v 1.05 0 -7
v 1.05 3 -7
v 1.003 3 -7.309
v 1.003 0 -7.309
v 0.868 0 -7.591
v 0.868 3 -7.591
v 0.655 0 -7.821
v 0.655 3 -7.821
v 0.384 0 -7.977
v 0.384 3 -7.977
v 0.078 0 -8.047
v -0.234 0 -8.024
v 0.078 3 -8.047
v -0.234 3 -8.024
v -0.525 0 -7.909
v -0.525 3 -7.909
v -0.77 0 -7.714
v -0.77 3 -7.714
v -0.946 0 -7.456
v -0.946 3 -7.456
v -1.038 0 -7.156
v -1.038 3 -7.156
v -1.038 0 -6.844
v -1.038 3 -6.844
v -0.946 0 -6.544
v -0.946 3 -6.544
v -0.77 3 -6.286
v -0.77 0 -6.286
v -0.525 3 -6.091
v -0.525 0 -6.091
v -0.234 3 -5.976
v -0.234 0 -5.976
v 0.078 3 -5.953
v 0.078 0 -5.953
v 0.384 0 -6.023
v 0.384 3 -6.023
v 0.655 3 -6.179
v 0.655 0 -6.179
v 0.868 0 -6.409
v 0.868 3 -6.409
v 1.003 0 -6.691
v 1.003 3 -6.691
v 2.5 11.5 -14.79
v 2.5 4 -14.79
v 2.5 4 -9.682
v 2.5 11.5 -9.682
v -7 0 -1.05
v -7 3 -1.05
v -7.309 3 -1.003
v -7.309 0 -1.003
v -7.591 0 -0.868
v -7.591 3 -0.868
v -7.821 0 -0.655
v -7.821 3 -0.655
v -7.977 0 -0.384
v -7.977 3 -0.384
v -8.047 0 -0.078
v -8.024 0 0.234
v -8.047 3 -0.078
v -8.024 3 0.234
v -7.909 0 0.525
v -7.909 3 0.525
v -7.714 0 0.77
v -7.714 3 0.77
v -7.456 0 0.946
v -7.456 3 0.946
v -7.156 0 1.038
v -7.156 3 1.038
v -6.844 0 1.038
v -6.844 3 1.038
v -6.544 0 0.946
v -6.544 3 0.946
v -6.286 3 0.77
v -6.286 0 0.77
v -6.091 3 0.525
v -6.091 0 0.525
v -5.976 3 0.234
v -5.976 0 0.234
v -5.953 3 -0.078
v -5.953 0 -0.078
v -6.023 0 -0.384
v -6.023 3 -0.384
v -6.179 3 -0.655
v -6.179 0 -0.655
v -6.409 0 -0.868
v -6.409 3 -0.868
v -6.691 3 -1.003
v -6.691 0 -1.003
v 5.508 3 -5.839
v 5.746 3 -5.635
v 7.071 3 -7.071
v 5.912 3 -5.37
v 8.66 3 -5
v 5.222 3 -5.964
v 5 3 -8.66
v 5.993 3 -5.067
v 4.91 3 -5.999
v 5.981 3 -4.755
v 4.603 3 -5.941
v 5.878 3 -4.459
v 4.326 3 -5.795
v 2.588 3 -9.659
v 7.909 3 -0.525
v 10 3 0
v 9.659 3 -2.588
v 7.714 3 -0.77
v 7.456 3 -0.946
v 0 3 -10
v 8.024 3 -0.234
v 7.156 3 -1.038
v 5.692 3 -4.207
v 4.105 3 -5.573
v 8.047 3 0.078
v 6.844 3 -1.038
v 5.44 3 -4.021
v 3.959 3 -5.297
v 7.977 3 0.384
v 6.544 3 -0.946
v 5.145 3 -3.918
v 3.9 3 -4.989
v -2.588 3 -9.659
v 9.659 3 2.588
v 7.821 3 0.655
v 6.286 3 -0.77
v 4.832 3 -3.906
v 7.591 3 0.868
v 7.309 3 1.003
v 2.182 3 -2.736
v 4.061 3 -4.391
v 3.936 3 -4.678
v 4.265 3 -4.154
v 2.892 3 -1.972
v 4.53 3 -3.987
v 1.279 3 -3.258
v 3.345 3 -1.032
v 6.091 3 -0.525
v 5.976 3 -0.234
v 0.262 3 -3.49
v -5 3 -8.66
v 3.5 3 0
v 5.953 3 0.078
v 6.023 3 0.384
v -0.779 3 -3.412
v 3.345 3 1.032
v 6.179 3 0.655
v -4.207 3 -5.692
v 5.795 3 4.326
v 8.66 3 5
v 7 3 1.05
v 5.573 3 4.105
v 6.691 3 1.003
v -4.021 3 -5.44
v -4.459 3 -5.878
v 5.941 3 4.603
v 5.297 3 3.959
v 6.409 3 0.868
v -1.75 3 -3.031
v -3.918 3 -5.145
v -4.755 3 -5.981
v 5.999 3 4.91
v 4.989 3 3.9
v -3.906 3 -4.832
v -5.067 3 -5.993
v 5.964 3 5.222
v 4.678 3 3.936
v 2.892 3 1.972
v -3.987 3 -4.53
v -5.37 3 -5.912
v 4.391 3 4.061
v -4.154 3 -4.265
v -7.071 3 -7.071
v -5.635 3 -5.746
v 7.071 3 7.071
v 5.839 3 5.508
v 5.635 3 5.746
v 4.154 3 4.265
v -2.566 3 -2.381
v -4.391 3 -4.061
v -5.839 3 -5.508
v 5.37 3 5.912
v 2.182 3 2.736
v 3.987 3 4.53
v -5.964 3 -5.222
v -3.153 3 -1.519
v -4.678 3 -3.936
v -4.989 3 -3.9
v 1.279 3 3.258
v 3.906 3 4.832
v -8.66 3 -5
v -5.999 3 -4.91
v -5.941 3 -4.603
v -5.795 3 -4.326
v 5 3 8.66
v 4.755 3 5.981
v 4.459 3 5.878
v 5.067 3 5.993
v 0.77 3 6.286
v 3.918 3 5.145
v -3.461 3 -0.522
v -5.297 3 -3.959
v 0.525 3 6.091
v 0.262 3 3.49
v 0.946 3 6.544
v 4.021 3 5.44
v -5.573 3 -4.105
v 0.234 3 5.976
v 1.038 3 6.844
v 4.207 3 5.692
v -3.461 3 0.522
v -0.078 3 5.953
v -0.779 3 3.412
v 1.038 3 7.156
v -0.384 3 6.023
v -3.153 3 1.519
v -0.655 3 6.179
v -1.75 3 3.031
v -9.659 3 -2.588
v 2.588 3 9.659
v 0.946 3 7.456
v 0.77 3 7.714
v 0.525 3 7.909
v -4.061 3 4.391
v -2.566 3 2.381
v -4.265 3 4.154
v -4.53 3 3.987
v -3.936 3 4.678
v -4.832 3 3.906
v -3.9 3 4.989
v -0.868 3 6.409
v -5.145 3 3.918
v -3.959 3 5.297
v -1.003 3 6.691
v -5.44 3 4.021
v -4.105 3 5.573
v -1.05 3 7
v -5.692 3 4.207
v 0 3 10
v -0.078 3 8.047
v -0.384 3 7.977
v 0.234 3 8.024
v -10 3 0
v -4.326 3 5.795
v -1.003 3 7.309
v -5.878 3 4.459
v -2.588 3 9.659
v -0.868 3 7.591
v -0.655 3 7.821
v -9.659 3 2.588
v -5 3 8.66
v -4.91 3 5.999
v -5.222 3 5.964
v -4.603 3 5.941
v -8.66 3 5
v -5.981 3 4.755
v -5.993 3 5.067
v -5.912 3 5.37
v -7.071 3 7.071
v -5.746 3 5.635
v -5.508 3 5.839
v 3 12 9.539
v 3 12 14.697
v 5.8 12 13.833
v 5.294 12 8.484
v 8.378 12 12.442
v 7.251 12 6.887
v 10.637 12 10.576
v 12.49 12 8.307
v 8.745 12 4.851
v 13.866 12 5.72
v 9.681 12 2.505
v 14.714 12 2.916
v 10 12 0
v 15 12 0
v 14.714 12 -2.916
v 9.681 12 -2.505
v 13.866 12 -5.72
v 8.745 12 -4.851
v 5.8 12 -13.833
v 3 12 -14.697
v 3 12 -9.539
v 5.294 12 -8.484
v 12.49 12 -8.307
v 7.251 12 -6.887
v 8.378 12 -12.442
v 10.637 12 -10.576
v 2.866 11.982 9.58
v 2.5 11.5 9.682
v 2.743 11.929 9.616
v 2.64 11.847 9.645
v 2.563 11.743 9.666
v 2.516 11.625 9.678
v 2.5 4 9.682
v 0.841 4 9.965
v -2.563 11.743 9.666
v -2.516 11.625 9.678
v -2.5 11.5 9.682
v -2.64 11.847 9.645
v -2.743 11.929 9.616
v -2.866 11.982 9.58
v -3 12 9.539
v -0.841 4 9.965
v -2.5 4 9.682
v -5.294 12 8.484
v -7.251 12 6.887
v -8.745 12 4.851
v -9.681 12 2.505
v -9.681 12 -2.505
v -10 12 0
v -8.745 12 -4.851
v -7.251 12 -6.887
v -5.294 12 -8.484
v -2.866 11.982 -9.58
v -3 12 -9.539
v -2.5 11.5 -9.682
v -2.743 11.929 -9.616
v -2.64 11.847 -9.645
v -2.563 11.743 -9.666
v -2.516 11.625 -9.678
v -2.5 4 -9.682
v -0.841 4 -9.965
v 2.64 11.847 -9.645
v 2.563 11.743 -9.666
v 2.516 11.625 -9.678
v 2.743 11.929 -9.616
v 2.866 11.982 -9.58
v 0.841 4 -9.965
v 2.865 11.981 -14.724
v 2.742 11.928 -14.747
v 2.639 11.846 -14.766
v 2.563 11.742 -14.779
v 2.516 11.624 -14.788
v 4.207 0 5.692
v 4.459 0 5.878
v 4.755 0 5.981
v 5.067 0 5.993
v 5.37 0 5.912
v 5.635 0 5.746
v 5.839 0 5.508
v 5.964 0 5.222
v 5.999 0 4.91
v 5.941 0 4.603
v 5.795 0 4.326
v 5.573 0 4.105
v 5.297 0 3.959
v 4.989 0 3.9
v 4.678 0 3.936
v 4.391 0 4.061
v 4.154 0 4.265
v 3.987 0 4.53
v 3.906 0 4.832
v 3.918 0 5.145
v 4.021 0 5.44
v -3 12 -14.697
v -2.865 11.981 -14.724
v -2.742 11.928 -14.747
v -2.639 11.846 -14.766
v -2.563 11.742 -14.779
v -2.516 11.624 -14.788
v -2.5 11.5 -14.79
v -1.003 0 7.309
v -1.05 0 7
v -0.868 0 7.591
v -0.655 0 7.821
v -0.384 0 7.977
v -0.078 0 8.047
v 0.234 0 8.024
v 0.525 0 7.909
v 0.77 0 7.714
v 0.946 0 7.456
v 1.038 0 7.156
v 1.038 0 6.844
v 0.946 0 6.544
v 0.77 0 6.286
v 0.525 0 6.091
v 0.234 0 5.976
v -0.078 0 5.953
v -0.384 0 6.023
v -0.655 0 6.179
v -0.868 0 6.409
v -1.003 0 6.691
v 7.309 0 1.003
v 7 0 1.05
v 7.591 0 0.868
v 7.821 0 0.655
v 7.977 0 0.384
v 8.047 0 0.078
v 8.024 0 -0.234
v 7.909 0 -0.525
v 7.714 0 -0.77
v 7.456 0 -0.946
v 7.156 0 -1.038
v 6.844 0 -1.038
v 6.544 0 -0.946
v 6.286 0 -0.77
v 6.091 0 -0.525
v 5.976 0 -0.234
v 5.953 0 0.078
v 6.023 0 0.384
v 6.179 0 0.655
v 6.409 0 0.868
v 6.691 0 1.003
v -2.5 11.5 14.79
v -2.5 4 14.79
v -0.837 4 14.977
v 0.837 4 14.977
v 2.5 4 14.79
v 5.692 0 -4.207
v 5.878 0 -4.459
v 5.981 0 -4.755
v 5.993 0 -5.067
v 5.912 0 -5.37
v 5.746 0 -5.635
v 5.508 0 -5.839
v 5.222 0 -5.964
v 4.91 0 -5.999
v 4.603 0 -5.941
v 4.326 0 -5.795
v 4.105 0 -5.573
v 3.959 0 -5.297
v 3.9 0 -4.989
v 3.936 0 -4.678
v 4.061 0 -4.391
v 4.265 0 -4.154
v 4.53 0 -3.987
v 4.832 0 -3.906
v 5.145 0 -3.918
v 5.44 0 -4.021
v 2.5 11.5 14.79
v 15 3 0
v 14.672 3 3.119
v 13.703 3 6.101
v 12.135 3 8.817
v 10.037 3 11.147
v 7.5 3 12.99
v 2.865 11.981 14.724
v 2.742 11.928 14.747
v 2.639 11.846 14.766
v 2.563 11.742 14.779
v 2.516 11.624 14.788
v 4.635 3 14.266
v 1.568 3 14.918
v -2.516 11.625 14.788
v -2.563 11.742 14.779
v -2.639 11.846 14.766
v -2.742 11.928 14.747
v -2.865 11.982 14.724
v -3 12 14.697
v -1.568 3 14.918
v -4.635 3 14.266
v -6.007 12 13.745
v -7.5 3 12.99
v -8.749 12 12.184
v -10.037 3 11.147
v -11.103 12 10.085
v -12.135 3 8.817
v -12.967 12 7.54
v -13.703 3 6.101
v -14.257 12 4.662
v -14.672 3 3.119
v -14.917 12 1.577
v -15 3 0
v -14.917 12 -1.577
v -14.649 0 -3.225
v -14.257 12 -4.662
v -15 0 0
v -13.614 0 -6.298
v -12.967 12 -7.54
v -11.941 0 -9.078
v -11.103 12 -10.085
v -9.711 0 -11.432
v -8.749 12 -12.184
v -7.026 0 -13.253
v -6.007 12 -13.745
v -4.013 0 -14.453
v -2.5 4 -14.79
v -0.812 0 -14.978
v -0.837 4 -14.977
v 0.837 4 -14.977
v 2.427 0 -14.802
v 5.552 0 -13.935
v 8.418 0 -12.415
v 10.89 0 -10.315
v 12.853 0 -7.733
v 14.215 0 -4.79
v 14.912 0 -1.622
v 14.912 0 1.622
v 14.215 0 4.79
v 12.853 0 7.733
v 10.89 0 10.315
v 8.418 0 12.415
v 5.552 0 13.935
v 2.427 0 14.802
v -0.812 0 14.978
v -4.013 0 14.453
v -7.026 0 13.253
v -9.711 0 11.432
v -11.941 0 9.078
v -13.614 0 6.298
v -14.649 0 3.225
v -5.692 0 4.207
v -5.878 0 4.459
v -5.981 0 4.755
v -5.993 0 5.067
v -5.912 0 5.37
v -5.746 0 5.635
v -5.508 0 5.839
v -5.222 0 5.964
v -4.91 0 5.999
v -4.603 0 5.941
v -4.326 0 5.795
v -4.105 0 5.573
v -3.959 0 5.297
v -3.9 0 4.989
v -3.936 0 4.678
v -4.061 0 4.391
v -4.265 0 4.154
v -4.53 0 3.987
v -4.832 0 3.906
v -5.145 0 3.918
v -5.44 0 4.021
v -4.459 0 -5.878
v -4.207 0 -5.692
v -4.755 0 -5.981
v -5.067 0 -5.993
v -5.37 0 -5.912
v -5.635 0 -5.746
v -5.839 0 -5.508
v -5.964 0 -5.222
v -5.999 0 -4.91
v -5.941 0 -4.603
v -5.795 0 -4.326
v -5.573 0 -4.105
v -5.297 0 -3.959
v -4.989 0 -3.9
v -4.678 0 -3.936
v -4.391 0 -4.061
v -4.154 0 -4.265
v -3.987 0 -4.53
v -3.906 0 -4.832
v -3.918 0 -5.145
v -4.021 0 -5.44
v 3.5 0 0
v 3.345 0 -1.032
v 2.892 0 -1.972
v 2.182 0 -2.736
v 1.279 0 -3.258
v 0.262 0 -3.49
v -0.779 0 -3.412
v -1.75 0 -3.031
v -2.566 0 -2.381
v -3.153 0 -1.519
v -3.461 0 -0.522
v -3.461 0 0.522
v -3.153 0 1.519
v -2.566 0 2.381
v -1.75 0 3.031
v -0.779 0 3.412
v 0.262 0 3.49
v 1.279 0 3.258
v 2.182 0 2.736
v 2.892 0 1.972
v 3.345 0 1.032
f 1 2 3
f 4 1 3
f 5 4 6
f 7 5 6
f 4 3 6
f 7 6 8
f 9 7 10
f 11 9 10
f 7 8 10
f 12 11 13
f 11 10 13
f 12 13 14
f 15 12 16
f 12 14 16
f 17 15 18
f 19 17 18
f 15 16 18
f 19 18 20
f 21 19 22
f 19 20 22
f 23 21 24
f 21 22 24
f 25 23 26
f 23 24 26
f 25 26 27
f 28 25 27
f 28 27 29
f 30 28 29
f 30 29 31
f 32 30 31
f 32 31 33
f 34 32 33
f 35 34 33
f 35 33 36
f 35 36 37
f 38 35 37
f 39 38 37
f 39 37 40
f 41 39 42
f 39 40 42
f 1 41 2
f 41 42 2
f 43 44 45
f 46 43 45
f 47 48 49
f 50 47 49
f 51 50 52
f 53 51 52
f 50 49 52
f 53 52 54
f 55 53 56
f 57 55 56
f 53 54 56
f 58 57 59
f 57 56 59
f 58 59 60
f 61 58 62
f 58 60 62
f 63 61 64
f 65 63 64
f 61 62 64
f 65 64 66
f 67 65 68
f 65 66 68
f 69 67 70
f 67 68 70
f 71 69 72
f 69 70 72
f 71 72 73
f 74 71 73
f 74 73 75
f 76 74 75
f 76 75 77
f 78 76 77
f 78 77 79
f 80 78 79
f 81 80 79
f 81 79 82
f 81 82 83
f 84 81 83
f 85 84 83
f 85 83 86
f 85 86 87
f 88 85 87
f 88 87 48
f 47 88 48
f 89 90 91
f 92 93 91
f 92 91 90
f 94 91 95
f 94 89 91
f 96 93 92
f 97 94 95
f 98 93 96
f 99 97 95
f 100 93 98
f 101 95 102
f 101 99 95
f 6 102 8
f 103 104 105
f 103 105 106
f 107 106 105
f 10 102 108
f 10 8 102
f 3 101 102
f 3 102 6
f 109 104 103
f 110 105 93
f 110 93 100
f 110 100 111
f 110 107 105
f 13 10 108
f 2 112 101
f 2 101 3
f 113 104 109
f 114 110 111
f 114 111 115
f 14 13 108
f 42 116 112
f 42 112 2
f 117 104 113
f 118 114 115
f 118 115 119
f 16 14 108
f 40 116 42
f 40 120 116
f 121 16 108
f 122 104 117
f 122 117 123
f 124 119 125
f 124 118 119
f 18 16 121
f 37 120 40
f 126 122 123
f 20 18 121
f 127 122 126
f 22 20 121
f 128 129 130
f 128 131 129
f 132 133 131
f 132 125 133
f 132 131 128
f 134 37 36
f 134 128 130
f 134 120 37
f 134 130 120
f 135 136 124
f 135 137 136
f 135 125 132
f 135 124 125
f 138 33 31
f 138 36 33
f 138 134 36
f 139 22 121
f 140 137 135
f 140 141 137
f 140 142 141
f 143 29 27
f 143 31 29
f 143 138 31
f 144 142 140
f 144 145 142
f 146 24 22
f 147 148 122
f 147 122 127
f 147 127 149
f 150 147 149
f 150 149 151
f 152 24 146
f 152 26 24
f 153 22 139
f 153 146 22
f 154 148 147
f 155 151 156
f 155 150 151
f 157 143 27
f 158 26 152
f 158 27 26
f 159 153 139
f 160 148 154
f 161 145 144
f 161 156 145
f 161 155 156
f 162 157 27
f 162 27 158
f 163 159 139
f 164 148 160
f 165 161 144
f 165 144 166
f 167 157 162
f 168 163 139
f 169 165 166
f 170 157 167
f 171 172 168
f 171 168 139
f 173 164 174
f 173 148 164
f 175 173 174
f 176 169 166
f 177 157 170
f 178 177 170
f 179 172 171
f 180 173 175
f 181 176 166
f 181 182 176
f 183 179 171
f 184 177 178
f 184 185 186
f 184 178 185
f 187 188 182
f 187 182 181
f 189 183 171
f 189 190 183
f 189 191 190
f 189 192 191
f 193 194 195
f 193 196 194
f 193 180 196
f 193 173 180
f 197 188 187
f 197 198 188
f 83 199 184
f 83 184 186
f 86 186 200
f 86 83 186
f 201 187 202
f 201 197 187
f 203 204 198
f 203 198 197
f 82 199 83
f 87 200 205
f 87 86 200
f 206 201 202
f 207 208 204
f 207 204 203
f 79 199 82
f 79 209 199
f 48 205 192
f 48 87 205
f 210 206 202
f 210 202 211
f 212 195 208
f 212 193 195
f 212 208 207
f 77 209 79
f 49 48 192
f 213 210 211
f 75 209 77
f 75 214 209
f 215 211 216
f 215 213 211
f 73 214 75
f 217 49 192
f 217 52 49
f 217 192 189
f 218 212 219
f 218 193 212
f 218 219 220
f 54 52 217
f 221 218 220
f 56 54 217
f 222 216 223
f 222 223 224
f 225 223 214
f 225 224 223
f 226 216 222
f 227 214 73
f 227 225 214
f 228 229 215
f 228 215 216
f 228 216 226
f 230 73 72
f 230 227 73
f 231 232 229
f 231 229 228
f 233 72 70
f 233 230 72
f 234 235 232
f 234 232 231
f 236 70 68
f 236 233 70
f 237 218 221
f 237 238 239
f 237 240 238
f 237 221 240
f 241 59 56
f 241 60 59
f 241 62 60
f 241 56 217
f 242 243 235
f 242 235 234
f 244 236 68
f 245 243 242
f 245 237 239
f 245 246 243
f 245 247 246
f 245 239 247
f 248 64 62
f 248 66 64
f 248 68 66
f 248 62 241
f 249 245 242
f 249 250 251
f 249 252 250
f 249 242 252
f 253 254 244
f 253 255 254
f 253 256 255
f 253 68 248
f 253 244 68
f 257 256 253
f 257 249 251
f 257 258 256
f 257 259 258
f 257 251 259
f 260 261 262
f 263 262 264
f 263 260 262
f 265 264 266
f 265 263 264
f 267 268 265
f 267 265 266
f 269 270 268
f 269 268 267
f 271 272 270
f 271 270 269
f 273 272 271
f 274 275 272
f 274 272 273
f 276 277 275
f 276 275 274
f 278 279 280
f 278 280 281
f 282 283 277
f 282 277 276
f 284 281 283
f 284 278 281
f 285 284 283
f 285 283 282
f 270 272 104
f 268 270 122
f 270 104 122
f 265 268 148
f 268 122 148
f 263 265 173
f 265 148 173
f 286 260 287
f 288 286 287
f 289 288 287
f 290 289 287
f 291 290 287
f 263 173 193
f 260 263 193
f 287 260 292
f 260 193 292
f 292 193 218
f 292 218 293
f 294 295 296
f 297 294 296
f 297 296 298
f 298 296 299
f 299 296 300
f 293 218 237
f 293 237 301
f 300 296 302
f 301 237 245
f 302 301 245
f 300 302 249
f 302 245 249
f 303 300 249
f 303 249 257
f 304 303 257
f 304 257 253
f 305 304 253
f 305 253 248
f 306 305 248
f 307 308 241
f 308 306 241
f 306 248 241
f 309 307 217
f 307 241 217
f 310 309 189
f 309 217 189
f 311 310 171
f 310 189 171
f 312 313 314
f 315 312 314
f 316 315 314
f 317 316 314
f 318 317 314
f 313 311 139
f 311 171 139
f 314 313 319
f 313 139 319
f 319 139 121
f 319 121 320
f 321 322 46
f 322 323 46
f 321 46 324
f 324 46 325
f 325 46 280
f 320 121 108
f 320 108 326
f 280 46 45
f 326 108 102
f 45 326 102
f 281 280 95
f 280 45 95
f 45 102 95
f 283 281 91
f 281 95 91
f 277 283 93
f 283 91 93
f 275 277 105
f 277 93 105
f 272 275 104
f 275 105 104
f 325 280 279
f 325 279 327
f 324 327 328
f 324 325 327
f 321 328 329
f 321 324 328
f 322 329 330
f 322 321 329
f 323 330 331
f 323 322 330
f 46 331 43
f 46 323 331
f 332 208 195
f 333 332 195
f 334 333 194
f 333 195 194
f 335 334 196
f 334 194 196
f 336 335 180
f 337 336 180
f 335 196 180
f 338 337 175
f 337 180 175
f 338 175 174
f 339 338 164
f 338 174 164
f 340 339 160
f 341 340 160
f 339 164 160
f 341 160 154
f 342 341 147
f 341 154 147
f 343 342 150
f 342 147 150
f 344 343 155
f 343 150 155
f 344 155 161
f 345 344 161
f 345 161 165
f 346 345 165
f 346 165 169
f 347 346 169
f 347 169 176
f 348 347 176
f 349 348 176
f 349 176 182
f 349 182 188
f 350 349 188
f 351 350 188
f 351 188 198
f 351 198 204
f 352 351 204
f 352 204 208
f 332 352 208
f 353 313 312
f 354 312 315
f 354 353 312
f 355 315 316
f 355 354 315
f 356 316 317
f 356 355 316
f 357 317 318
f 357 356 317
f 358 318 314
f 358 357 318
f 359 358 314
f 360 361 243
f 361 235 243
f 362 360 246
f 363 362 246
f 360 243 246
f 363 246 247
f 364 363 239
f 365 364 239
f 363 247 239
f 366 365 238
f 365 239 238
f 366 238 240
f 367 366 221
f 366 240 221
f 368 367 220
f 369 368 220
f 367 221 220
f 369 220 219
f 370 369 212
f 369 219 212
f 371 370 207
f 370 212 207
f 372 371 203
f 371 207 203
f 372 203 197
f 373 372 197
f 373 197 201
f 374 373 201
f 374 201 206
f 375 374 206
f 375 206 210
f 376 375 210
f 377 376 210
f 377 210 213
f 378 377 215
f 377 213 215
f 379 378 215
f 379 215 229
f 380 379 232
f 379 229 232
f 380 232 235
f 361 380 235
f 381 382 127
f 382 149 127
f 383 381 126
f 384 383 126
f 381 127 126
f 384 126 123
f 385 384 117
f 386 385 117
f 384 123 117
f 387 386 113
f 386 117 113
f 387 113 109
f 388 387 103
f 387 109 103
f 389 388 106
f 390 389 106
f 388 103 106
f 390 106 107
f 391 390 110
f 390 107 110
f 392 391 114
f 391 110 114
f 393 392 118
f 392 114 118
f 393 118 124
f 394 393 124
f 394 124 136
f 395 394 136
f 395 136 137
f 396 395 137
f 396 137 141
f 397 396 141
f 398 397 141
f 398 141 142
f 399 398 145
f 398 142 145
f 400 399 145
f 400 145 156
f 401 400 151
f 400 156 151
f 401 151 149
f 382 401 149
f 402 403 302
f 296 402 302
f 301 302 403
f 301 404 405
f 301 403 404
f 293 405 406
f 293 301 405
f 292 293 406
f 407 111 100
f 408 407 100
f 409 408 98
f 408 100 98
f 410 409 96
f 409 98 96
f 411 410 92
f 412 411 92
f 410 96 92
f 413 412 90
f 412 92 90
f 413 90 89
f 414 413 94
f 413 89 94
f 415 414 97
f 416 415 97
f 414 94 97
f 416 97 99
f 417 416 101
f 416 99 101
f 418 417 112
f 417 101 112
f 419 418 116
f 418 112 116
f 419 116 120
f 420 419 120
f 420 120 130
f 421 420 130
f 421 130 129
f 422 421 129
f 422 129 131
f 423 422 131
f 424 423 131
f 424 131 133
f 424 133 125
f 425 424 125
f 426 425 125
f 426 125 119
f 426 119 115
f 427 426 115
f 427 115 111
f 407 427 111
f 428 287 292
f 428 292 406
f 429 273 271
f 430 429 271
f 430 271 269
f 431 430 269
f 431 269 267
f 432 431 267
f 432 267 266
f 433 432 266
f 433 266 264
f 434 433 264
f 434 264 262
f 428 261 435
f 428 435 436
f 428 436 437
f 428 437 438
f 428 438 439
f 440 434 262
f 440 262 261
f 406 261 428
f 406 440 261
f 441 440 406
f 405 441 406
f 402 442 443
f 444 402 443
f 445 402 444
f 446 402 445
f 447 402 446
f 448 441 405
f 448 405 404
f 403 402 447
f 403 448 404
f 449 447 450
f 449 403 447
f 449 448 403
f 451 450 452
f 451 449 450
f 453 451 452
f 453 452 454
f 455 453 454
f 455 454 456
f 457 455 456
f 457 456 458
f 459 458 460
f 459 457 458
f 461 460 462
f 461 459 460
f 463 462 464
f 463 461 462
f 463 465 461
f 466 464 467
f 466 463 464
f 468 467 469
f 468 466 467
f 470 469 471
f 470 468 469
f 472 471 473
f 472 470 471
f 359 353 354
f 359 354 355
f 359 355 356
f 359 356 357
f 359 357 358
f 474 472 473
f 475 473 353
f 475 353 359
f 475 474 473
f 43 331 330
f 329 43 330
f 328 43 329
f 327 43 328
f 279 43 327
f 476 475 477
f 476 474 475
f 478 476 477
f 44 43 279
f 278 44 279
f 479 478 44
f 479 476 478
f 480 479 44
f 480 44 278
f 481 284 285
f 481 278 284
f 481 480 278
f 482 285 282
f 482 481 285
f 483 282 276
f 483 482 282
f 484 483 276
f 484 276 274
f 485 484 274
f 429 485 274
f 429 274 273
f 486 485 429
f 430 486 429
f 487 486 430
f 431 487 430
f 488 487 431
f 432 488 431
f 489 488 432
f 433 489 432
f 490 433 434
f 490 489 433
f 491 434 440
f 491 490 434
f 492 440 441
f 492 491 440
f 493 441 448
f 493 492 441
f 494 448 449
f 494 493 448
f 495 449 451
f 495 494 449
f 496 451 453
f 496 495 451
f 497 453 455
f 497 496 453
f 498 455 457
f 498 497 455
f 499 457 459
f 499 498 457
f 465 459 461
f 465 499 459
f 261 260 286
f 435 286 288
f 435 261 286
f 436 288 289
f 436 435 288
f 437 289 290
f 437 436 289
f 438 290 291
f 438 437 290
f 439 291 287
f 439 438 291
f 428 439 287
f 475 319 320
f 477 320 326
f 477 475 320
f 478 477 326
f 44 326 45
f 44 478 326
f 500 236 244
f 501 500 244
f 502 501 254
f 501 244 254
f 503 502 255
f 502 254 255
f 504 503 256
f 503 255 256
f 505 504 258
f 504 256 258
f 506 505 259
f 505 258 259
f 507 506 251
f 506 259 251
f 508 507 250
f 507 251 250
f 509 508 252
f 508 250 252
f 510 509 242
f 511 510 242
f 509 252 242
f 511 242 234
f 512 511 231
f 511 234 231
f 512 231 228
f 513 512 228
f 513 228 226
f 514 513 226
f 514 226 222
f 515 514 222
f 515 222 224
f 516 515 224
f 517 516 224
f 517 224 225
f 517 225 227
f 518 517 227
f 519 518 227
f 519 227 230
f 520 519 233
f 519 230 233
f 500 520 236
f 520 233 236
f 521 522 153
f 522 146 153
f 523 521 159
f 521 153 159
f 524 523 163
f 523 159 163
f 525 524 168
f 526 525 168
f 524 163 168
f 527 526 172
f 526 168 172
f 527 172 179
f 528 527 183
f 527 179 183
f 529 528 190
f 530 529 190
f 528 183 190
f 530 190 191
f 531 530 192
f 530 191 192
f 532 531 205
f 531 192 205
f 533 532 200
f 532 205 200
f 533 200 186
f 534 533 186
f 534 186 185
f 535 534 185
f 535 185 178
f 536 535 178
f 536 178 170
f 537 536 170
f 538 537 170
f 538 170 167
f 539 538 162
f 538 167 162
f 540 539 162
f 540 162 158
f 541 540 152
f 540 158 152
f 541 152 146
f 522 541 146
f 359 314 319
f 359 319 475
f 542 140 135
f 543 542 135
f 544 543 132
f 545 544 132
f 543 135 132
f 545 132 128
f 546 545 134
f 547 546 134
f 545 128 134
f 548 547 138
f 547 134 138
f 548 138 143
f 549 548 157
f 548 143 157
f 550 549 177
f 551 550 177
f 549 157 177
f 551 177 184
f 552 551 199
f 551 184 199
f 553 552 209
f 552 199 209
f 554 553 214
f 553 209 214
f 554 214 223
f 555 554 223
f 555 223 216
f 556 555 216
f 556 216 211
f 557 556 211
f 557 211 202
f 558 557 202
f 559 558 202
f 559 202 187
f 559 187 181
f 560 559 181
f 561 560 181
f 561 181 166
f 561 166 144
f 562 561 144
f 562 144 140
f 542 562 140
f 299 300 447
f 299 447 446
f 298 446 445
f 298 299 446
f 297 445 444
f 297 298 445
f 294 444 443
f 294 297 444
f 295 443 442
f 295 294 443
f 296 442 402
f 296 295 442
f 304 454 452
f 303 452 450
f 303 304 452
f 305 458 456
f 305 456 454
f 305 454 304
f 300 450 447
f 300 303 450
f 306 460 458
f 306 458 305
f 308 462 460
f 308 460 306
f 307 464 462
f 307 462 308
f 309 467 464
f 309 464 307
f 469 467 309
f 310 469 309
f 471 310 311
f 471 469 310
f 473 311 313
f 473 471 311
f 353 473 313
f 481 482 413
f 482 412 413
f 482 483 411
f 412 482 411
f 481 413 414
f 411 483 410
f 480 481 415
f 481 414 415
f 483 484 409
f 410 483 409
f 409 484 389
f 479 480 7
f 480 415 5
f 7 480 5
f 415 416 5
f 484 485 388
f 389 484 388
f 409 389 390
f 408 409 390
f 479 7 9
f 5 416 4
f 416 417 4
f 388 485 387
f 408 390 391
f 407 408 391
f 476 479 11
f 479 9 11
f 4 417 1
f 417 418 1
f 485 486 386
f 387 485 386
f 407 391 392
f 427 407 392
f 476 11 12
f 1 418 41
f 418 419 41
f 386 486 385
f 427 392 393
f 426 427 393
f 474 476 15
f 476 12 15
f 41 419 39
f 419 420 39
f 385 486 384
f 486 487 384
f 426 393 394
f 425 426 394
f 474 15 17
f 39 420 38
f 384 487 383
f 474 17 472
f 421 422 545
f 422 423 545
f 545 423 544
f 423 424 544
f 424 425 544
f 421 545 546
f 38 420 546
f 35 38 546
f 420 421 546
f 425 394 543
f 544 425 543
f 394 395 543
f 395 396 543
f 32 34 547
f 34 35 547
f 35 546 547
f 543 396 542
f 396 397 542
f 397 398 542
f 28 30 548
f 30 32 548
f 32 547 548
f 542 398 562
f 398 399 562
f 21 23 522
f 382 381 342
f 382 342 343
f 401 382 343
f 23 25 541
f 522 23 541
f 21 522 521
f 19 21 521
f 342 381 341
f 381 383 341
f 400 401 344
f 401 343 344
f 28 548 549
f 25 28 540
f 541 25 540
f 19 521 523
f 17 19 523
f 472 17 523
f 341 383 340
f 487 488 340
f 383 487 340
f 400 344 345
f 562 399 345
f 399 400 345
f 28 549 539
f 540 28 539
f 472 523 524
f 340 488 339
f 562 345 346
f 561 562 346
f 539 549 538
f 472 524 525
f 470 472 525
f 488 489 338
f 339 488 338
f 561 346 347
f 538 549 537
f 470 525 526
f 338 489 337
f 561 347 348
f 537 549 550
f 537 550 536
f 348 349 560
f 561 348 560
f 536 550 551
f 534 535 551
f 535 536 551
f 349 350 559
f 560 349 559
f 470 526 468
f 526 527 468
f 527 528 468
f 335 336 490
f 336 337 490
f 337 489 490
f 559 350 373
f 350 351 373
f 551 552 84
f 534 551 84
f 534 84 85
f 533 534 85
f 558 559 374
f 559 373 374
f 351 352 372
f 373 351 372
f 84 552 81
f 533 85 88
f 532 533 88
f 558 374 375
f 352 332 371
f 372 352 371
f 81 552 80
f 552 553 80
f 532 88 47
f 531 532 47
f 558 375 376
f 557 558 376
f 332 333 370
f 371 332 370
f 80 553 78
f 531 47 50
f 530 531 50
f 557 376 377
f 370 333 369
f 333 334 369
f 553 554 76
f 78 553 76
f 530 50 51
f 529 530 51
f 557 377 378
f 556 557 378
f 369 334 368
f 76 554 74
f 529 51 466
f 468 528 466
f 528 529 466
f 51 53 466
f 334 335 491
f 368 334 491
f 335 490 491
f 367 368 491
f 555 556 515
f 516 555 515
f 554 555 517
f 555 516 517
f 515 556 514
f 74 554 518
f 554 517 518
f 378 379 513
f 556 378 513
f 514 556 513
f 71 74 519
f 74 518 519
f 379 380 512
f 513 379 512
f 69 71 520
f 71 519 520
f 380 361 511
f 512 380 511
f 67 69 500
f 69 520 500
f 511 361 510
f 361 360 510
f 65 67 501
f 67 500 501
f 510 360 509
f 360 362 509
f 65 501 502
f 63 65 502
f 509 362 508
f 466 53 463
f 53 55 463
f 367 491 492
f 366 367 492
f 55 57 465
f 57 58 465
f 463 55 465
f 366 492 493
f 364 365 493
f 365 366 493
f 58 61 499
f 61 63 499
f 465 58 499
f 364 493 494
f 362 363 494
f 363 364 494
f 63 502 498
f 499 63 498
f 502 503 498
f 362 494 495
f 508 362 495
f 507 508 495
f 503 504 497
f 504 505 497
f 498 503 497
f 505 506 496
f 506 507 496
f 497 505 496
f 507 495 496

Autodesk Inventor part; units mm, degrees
ref_plane "YZ Plane" through (0, 0, 0) normal (1, 0, 0) x (0, 1, 0)
ref_plane "XZ Plane" through (0, 0, 0) normal (0, 1, 0) x (-1, 0, 0)
ref_plane "XY Plane" through (0, 0, 0) normal (0, 0, 1) x (1, 0, 0)
sketch "Sketch1" plane through (0, 0, 0) normal (0, 1, 0) x (-1, 0, 0)
  circle A0 centre (0, 0) radius 15
  dimension "d0" = 30
extrude "Extrusion1" add sketch "Sketch1" along normal blind 3
sketch "Sketch2" plane through (0, 3, 0) normal (0, 1, 0) x (1, 0, 0)
  circle A0 centre (0, 0) radius 15
  circle A1 centre (0, 0) radius 10
  dimension "d3" = 30
  dimension "d4" = 20
extrude "Extrusion2" add sketch "Sketch2" along normal blind 9
sketch "Sketch3" plane through (0, 12, 0) normal (0, 1, 0) x (1, 0, 0)
  line L0 (2.5, -15) -> (-2.5, -15)
  line L1 (-2.5, -15) -> (-2.5, 15)
  line L2 (-2.5, 15) -> (2.5, 15)
  line L3 (2.5, 15) -> (2.5, -15)
  line L4 (2.5, -15) -> (-2.5, 15) construction
  line L5 (-2.5, -15) -> (2.5, 15) construction
  point P0 (0, 0)
  dimension "d7" = 5
  dimension "d8" = 30
extrude "Extrusion3" cut sketch "Sketch3" against normal blind 8
fillet "Fillet1" radius 0.5 4 edges at (-2.5, 12, 12.2363) (-2.5, 12, -12.2363) (2.5, 12, 12.2363) (2.5, 12, -12.2363)
sketch "Sketch4" plane through (0, 3, 0) normal (0, 1, 0) x (1, 0, 0)
  circle A0 centre (0, 7) radius 1.05
  point P0 (0, 0)
  dimension "d12" = 2.1
  dimension "d13" = 7
extrude "Extrusion4" cut sketch "Sketch4" against normal through all
pattern_circular "Circular Pattern1" count 8 over 360 about axis through (0, -10, 0) along (0, 1, 0) of "Extrusion4"
sketch "Sketch5" plane through (0, 3, 0) normal (0, 1, 0) x (1, 0, 0)
  circle A0 centre (0, 0) radius 3.5
  dimension "d19" = 7
extrude "Extrusion5" cut sketch "Sketch5" against normal blind 10
properties part number "nozzle_motor_bracket"
